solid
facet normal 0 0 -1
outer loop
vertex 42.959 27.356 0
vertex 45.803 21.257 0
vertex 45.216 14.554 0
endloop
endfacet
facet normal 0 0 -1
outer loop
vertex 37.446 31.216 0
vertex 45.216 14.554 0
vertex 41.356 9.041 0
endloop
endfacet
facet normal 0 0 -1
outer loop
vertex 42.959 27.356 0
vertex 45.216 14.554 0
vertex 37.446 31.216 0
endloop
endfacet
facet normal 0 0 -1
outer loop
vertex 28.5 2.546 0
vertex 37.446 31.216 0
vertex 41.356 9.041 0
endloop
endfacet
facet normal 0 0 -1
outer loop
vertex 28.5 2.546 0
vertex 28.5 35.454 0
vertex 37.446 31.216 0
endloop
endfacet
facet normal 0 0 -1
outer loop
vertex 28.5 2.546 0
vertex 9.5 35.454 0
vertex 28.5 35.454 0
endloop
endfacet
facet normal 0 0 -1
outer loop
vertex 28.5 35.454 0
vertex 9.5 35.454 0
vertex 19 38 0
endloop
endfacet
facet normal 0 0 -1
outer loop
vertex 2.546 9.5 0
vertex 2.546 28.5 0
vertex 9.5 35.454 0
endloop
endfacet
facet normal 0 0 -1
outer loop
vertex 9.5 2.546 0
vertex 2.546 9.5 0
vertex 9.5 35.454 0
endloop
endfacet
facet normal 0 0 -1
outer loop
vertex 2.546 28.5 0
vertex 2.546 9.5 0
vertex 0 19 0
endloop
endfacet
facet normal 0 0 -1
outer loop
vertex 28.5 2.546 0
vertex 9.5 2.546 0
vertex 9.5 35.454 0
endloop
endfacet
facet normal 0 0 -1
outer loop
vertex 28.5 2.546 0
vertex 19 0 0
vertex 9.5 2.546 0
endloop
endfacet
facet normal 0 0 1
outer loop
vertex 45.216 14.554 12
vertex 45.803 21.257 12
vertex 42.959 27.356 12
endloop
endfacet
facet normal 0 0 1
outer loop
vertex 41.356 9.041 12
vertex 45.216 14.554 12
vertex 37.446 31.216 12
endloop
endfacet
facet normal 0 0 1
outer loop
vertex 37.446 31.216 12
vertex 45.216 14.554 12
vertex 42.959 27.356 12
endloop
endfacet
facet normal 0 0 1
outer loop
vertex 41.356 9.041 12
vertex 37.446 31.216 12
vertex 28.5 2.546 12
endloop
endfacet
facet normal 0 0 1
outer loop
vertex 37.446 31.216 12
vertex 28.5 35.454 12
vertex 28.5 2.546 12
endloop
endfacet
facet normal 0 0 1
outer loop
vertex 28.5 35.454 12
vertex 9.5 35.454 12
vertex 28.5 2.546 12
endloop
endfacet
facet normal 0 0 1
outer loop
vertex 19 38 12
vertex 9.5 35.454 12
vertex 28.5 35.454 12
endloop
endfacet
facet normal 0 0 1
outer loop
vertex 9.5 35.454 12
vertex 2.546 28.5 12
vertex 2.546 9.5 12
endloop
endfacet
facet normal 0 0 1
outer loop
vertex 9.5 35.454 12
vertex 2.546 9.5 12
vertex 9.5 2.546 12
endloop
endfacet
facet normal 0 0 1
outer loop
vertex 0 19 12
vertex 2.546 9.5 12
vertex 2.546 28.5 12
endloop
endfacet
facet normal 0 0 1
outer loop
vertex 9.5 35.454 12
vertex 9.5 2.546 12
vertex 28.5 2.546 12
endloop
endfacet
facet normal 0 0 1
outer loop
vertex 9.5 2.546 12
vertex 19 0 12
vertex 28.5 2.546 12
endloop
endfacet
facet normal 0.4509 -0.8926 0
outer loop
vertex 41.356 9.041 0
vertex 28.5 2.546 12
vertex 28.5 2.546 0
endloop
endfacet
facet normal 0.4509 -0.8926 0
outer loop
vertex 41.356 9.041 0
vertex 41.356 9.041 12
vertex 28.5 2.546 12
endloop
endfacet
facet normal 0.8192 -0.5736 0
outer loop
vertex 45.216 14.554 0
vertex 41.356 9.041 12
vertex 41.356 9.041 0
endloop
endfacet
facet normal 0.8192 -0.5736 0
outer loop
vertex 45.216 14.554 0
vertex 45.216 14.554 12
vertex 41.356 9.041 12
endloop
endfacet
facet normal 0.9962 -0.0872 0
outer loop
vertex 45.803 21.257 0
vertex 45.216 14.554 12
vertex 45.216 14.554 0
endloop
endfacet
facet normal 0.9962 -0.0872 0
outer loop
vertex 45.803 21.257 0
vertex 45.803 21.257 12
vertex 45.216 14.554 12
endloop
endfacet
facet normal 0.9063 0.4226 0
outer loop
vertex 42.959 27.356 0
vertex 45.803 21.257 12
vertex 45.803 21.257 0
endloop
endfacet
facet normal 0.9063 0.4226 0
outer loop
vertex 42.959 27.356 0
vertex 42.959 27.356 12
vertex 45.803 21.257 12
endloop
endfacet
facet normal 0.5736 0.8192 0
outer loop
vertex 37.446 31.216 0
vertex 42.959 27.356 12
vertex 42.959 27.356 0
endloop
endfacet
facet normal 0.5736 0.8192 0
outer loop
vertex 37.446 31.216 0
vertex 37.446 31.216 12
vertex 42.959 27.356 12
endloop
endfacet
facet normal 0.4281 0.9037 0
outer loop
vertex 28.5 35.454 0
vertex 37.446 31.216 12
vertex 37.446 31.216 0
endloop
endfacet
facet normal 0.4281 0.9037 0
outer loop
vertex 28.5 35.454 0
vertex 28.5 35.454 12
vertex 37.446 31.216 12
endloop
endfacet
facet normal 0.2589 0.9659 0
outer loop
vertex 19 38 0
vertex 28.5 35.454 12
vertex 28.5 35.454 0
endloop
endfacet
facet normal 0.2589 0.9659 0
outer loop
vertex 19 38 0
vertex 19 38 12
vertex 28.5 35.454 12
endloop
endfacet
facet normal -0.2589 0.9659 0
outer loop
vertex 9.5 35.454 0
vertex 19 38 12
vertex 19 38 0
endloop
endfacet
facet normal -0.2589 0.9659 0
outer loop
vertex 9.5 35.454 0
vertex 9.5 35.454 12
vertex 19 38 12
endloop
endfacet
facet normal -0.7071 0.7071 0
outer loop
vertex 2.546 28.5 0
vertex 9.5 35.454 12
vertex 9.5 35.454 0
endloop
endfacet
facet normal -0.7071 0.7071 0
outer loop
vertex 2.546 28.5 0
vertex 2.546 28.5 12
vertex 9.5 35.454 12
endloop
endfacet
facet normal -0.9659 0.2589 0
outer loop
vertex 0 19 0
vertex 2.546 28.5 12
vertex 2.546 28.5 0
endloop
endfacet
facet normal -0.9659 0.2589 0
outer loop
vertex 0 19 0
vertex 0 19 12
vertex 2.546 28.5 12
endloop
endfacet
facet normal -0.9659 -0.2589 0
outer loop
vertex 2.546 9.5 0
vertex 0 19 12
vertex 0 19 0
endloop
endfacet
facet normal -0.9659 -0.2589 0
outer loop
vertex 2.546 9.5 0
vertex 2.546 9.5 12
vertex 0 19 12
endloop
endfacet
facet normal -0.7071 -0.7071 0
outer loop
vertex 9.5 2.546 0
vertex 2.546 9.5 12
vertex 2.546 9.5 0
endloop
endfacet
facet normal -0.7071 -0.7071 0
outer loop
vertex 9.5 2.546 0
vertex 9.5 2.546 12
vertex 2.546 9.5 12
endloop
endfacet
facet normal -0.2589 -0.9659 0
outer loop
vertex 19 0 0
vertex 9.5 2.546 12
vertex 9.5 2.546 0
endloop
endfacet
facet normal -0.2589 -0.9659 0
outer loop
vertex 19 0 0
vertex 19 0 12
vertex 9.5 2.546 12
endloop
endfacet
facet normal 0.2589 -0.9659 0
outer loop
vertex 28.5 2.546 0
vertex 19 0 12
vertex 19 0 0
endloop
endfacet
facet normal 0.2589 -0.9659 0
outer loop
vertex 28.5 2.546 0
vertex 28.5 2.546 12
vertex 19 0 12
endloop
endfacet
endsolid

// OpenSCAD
$fn = 32;

// ----------------------------------------------------------------------
// Eccentric disc: step, 12 mm thick
// ----------------------------------------------------------------------

// --- parameters (mm) ---
profile_height = 12;      // extrusion height
profile_points = 14;      // points of the closed outline

profile = [[0, 19], [2.546, 9.5], [9.5, 2.546], [19, 0], [28.5, 2.546], [41.356, 9.041], [45.216, 14.554], [45.803, 21.257], [42.959, 27.356], [37.446, 31.216], [28.5, 35.454], [19, 38], [9.5, 35.454], [2.546, 28.5]];  // single closed polygon, 14 points, counter clockwise

// --- the one profile operation ---
linear_extrude(height = profile_height) polygon(points = profile);
